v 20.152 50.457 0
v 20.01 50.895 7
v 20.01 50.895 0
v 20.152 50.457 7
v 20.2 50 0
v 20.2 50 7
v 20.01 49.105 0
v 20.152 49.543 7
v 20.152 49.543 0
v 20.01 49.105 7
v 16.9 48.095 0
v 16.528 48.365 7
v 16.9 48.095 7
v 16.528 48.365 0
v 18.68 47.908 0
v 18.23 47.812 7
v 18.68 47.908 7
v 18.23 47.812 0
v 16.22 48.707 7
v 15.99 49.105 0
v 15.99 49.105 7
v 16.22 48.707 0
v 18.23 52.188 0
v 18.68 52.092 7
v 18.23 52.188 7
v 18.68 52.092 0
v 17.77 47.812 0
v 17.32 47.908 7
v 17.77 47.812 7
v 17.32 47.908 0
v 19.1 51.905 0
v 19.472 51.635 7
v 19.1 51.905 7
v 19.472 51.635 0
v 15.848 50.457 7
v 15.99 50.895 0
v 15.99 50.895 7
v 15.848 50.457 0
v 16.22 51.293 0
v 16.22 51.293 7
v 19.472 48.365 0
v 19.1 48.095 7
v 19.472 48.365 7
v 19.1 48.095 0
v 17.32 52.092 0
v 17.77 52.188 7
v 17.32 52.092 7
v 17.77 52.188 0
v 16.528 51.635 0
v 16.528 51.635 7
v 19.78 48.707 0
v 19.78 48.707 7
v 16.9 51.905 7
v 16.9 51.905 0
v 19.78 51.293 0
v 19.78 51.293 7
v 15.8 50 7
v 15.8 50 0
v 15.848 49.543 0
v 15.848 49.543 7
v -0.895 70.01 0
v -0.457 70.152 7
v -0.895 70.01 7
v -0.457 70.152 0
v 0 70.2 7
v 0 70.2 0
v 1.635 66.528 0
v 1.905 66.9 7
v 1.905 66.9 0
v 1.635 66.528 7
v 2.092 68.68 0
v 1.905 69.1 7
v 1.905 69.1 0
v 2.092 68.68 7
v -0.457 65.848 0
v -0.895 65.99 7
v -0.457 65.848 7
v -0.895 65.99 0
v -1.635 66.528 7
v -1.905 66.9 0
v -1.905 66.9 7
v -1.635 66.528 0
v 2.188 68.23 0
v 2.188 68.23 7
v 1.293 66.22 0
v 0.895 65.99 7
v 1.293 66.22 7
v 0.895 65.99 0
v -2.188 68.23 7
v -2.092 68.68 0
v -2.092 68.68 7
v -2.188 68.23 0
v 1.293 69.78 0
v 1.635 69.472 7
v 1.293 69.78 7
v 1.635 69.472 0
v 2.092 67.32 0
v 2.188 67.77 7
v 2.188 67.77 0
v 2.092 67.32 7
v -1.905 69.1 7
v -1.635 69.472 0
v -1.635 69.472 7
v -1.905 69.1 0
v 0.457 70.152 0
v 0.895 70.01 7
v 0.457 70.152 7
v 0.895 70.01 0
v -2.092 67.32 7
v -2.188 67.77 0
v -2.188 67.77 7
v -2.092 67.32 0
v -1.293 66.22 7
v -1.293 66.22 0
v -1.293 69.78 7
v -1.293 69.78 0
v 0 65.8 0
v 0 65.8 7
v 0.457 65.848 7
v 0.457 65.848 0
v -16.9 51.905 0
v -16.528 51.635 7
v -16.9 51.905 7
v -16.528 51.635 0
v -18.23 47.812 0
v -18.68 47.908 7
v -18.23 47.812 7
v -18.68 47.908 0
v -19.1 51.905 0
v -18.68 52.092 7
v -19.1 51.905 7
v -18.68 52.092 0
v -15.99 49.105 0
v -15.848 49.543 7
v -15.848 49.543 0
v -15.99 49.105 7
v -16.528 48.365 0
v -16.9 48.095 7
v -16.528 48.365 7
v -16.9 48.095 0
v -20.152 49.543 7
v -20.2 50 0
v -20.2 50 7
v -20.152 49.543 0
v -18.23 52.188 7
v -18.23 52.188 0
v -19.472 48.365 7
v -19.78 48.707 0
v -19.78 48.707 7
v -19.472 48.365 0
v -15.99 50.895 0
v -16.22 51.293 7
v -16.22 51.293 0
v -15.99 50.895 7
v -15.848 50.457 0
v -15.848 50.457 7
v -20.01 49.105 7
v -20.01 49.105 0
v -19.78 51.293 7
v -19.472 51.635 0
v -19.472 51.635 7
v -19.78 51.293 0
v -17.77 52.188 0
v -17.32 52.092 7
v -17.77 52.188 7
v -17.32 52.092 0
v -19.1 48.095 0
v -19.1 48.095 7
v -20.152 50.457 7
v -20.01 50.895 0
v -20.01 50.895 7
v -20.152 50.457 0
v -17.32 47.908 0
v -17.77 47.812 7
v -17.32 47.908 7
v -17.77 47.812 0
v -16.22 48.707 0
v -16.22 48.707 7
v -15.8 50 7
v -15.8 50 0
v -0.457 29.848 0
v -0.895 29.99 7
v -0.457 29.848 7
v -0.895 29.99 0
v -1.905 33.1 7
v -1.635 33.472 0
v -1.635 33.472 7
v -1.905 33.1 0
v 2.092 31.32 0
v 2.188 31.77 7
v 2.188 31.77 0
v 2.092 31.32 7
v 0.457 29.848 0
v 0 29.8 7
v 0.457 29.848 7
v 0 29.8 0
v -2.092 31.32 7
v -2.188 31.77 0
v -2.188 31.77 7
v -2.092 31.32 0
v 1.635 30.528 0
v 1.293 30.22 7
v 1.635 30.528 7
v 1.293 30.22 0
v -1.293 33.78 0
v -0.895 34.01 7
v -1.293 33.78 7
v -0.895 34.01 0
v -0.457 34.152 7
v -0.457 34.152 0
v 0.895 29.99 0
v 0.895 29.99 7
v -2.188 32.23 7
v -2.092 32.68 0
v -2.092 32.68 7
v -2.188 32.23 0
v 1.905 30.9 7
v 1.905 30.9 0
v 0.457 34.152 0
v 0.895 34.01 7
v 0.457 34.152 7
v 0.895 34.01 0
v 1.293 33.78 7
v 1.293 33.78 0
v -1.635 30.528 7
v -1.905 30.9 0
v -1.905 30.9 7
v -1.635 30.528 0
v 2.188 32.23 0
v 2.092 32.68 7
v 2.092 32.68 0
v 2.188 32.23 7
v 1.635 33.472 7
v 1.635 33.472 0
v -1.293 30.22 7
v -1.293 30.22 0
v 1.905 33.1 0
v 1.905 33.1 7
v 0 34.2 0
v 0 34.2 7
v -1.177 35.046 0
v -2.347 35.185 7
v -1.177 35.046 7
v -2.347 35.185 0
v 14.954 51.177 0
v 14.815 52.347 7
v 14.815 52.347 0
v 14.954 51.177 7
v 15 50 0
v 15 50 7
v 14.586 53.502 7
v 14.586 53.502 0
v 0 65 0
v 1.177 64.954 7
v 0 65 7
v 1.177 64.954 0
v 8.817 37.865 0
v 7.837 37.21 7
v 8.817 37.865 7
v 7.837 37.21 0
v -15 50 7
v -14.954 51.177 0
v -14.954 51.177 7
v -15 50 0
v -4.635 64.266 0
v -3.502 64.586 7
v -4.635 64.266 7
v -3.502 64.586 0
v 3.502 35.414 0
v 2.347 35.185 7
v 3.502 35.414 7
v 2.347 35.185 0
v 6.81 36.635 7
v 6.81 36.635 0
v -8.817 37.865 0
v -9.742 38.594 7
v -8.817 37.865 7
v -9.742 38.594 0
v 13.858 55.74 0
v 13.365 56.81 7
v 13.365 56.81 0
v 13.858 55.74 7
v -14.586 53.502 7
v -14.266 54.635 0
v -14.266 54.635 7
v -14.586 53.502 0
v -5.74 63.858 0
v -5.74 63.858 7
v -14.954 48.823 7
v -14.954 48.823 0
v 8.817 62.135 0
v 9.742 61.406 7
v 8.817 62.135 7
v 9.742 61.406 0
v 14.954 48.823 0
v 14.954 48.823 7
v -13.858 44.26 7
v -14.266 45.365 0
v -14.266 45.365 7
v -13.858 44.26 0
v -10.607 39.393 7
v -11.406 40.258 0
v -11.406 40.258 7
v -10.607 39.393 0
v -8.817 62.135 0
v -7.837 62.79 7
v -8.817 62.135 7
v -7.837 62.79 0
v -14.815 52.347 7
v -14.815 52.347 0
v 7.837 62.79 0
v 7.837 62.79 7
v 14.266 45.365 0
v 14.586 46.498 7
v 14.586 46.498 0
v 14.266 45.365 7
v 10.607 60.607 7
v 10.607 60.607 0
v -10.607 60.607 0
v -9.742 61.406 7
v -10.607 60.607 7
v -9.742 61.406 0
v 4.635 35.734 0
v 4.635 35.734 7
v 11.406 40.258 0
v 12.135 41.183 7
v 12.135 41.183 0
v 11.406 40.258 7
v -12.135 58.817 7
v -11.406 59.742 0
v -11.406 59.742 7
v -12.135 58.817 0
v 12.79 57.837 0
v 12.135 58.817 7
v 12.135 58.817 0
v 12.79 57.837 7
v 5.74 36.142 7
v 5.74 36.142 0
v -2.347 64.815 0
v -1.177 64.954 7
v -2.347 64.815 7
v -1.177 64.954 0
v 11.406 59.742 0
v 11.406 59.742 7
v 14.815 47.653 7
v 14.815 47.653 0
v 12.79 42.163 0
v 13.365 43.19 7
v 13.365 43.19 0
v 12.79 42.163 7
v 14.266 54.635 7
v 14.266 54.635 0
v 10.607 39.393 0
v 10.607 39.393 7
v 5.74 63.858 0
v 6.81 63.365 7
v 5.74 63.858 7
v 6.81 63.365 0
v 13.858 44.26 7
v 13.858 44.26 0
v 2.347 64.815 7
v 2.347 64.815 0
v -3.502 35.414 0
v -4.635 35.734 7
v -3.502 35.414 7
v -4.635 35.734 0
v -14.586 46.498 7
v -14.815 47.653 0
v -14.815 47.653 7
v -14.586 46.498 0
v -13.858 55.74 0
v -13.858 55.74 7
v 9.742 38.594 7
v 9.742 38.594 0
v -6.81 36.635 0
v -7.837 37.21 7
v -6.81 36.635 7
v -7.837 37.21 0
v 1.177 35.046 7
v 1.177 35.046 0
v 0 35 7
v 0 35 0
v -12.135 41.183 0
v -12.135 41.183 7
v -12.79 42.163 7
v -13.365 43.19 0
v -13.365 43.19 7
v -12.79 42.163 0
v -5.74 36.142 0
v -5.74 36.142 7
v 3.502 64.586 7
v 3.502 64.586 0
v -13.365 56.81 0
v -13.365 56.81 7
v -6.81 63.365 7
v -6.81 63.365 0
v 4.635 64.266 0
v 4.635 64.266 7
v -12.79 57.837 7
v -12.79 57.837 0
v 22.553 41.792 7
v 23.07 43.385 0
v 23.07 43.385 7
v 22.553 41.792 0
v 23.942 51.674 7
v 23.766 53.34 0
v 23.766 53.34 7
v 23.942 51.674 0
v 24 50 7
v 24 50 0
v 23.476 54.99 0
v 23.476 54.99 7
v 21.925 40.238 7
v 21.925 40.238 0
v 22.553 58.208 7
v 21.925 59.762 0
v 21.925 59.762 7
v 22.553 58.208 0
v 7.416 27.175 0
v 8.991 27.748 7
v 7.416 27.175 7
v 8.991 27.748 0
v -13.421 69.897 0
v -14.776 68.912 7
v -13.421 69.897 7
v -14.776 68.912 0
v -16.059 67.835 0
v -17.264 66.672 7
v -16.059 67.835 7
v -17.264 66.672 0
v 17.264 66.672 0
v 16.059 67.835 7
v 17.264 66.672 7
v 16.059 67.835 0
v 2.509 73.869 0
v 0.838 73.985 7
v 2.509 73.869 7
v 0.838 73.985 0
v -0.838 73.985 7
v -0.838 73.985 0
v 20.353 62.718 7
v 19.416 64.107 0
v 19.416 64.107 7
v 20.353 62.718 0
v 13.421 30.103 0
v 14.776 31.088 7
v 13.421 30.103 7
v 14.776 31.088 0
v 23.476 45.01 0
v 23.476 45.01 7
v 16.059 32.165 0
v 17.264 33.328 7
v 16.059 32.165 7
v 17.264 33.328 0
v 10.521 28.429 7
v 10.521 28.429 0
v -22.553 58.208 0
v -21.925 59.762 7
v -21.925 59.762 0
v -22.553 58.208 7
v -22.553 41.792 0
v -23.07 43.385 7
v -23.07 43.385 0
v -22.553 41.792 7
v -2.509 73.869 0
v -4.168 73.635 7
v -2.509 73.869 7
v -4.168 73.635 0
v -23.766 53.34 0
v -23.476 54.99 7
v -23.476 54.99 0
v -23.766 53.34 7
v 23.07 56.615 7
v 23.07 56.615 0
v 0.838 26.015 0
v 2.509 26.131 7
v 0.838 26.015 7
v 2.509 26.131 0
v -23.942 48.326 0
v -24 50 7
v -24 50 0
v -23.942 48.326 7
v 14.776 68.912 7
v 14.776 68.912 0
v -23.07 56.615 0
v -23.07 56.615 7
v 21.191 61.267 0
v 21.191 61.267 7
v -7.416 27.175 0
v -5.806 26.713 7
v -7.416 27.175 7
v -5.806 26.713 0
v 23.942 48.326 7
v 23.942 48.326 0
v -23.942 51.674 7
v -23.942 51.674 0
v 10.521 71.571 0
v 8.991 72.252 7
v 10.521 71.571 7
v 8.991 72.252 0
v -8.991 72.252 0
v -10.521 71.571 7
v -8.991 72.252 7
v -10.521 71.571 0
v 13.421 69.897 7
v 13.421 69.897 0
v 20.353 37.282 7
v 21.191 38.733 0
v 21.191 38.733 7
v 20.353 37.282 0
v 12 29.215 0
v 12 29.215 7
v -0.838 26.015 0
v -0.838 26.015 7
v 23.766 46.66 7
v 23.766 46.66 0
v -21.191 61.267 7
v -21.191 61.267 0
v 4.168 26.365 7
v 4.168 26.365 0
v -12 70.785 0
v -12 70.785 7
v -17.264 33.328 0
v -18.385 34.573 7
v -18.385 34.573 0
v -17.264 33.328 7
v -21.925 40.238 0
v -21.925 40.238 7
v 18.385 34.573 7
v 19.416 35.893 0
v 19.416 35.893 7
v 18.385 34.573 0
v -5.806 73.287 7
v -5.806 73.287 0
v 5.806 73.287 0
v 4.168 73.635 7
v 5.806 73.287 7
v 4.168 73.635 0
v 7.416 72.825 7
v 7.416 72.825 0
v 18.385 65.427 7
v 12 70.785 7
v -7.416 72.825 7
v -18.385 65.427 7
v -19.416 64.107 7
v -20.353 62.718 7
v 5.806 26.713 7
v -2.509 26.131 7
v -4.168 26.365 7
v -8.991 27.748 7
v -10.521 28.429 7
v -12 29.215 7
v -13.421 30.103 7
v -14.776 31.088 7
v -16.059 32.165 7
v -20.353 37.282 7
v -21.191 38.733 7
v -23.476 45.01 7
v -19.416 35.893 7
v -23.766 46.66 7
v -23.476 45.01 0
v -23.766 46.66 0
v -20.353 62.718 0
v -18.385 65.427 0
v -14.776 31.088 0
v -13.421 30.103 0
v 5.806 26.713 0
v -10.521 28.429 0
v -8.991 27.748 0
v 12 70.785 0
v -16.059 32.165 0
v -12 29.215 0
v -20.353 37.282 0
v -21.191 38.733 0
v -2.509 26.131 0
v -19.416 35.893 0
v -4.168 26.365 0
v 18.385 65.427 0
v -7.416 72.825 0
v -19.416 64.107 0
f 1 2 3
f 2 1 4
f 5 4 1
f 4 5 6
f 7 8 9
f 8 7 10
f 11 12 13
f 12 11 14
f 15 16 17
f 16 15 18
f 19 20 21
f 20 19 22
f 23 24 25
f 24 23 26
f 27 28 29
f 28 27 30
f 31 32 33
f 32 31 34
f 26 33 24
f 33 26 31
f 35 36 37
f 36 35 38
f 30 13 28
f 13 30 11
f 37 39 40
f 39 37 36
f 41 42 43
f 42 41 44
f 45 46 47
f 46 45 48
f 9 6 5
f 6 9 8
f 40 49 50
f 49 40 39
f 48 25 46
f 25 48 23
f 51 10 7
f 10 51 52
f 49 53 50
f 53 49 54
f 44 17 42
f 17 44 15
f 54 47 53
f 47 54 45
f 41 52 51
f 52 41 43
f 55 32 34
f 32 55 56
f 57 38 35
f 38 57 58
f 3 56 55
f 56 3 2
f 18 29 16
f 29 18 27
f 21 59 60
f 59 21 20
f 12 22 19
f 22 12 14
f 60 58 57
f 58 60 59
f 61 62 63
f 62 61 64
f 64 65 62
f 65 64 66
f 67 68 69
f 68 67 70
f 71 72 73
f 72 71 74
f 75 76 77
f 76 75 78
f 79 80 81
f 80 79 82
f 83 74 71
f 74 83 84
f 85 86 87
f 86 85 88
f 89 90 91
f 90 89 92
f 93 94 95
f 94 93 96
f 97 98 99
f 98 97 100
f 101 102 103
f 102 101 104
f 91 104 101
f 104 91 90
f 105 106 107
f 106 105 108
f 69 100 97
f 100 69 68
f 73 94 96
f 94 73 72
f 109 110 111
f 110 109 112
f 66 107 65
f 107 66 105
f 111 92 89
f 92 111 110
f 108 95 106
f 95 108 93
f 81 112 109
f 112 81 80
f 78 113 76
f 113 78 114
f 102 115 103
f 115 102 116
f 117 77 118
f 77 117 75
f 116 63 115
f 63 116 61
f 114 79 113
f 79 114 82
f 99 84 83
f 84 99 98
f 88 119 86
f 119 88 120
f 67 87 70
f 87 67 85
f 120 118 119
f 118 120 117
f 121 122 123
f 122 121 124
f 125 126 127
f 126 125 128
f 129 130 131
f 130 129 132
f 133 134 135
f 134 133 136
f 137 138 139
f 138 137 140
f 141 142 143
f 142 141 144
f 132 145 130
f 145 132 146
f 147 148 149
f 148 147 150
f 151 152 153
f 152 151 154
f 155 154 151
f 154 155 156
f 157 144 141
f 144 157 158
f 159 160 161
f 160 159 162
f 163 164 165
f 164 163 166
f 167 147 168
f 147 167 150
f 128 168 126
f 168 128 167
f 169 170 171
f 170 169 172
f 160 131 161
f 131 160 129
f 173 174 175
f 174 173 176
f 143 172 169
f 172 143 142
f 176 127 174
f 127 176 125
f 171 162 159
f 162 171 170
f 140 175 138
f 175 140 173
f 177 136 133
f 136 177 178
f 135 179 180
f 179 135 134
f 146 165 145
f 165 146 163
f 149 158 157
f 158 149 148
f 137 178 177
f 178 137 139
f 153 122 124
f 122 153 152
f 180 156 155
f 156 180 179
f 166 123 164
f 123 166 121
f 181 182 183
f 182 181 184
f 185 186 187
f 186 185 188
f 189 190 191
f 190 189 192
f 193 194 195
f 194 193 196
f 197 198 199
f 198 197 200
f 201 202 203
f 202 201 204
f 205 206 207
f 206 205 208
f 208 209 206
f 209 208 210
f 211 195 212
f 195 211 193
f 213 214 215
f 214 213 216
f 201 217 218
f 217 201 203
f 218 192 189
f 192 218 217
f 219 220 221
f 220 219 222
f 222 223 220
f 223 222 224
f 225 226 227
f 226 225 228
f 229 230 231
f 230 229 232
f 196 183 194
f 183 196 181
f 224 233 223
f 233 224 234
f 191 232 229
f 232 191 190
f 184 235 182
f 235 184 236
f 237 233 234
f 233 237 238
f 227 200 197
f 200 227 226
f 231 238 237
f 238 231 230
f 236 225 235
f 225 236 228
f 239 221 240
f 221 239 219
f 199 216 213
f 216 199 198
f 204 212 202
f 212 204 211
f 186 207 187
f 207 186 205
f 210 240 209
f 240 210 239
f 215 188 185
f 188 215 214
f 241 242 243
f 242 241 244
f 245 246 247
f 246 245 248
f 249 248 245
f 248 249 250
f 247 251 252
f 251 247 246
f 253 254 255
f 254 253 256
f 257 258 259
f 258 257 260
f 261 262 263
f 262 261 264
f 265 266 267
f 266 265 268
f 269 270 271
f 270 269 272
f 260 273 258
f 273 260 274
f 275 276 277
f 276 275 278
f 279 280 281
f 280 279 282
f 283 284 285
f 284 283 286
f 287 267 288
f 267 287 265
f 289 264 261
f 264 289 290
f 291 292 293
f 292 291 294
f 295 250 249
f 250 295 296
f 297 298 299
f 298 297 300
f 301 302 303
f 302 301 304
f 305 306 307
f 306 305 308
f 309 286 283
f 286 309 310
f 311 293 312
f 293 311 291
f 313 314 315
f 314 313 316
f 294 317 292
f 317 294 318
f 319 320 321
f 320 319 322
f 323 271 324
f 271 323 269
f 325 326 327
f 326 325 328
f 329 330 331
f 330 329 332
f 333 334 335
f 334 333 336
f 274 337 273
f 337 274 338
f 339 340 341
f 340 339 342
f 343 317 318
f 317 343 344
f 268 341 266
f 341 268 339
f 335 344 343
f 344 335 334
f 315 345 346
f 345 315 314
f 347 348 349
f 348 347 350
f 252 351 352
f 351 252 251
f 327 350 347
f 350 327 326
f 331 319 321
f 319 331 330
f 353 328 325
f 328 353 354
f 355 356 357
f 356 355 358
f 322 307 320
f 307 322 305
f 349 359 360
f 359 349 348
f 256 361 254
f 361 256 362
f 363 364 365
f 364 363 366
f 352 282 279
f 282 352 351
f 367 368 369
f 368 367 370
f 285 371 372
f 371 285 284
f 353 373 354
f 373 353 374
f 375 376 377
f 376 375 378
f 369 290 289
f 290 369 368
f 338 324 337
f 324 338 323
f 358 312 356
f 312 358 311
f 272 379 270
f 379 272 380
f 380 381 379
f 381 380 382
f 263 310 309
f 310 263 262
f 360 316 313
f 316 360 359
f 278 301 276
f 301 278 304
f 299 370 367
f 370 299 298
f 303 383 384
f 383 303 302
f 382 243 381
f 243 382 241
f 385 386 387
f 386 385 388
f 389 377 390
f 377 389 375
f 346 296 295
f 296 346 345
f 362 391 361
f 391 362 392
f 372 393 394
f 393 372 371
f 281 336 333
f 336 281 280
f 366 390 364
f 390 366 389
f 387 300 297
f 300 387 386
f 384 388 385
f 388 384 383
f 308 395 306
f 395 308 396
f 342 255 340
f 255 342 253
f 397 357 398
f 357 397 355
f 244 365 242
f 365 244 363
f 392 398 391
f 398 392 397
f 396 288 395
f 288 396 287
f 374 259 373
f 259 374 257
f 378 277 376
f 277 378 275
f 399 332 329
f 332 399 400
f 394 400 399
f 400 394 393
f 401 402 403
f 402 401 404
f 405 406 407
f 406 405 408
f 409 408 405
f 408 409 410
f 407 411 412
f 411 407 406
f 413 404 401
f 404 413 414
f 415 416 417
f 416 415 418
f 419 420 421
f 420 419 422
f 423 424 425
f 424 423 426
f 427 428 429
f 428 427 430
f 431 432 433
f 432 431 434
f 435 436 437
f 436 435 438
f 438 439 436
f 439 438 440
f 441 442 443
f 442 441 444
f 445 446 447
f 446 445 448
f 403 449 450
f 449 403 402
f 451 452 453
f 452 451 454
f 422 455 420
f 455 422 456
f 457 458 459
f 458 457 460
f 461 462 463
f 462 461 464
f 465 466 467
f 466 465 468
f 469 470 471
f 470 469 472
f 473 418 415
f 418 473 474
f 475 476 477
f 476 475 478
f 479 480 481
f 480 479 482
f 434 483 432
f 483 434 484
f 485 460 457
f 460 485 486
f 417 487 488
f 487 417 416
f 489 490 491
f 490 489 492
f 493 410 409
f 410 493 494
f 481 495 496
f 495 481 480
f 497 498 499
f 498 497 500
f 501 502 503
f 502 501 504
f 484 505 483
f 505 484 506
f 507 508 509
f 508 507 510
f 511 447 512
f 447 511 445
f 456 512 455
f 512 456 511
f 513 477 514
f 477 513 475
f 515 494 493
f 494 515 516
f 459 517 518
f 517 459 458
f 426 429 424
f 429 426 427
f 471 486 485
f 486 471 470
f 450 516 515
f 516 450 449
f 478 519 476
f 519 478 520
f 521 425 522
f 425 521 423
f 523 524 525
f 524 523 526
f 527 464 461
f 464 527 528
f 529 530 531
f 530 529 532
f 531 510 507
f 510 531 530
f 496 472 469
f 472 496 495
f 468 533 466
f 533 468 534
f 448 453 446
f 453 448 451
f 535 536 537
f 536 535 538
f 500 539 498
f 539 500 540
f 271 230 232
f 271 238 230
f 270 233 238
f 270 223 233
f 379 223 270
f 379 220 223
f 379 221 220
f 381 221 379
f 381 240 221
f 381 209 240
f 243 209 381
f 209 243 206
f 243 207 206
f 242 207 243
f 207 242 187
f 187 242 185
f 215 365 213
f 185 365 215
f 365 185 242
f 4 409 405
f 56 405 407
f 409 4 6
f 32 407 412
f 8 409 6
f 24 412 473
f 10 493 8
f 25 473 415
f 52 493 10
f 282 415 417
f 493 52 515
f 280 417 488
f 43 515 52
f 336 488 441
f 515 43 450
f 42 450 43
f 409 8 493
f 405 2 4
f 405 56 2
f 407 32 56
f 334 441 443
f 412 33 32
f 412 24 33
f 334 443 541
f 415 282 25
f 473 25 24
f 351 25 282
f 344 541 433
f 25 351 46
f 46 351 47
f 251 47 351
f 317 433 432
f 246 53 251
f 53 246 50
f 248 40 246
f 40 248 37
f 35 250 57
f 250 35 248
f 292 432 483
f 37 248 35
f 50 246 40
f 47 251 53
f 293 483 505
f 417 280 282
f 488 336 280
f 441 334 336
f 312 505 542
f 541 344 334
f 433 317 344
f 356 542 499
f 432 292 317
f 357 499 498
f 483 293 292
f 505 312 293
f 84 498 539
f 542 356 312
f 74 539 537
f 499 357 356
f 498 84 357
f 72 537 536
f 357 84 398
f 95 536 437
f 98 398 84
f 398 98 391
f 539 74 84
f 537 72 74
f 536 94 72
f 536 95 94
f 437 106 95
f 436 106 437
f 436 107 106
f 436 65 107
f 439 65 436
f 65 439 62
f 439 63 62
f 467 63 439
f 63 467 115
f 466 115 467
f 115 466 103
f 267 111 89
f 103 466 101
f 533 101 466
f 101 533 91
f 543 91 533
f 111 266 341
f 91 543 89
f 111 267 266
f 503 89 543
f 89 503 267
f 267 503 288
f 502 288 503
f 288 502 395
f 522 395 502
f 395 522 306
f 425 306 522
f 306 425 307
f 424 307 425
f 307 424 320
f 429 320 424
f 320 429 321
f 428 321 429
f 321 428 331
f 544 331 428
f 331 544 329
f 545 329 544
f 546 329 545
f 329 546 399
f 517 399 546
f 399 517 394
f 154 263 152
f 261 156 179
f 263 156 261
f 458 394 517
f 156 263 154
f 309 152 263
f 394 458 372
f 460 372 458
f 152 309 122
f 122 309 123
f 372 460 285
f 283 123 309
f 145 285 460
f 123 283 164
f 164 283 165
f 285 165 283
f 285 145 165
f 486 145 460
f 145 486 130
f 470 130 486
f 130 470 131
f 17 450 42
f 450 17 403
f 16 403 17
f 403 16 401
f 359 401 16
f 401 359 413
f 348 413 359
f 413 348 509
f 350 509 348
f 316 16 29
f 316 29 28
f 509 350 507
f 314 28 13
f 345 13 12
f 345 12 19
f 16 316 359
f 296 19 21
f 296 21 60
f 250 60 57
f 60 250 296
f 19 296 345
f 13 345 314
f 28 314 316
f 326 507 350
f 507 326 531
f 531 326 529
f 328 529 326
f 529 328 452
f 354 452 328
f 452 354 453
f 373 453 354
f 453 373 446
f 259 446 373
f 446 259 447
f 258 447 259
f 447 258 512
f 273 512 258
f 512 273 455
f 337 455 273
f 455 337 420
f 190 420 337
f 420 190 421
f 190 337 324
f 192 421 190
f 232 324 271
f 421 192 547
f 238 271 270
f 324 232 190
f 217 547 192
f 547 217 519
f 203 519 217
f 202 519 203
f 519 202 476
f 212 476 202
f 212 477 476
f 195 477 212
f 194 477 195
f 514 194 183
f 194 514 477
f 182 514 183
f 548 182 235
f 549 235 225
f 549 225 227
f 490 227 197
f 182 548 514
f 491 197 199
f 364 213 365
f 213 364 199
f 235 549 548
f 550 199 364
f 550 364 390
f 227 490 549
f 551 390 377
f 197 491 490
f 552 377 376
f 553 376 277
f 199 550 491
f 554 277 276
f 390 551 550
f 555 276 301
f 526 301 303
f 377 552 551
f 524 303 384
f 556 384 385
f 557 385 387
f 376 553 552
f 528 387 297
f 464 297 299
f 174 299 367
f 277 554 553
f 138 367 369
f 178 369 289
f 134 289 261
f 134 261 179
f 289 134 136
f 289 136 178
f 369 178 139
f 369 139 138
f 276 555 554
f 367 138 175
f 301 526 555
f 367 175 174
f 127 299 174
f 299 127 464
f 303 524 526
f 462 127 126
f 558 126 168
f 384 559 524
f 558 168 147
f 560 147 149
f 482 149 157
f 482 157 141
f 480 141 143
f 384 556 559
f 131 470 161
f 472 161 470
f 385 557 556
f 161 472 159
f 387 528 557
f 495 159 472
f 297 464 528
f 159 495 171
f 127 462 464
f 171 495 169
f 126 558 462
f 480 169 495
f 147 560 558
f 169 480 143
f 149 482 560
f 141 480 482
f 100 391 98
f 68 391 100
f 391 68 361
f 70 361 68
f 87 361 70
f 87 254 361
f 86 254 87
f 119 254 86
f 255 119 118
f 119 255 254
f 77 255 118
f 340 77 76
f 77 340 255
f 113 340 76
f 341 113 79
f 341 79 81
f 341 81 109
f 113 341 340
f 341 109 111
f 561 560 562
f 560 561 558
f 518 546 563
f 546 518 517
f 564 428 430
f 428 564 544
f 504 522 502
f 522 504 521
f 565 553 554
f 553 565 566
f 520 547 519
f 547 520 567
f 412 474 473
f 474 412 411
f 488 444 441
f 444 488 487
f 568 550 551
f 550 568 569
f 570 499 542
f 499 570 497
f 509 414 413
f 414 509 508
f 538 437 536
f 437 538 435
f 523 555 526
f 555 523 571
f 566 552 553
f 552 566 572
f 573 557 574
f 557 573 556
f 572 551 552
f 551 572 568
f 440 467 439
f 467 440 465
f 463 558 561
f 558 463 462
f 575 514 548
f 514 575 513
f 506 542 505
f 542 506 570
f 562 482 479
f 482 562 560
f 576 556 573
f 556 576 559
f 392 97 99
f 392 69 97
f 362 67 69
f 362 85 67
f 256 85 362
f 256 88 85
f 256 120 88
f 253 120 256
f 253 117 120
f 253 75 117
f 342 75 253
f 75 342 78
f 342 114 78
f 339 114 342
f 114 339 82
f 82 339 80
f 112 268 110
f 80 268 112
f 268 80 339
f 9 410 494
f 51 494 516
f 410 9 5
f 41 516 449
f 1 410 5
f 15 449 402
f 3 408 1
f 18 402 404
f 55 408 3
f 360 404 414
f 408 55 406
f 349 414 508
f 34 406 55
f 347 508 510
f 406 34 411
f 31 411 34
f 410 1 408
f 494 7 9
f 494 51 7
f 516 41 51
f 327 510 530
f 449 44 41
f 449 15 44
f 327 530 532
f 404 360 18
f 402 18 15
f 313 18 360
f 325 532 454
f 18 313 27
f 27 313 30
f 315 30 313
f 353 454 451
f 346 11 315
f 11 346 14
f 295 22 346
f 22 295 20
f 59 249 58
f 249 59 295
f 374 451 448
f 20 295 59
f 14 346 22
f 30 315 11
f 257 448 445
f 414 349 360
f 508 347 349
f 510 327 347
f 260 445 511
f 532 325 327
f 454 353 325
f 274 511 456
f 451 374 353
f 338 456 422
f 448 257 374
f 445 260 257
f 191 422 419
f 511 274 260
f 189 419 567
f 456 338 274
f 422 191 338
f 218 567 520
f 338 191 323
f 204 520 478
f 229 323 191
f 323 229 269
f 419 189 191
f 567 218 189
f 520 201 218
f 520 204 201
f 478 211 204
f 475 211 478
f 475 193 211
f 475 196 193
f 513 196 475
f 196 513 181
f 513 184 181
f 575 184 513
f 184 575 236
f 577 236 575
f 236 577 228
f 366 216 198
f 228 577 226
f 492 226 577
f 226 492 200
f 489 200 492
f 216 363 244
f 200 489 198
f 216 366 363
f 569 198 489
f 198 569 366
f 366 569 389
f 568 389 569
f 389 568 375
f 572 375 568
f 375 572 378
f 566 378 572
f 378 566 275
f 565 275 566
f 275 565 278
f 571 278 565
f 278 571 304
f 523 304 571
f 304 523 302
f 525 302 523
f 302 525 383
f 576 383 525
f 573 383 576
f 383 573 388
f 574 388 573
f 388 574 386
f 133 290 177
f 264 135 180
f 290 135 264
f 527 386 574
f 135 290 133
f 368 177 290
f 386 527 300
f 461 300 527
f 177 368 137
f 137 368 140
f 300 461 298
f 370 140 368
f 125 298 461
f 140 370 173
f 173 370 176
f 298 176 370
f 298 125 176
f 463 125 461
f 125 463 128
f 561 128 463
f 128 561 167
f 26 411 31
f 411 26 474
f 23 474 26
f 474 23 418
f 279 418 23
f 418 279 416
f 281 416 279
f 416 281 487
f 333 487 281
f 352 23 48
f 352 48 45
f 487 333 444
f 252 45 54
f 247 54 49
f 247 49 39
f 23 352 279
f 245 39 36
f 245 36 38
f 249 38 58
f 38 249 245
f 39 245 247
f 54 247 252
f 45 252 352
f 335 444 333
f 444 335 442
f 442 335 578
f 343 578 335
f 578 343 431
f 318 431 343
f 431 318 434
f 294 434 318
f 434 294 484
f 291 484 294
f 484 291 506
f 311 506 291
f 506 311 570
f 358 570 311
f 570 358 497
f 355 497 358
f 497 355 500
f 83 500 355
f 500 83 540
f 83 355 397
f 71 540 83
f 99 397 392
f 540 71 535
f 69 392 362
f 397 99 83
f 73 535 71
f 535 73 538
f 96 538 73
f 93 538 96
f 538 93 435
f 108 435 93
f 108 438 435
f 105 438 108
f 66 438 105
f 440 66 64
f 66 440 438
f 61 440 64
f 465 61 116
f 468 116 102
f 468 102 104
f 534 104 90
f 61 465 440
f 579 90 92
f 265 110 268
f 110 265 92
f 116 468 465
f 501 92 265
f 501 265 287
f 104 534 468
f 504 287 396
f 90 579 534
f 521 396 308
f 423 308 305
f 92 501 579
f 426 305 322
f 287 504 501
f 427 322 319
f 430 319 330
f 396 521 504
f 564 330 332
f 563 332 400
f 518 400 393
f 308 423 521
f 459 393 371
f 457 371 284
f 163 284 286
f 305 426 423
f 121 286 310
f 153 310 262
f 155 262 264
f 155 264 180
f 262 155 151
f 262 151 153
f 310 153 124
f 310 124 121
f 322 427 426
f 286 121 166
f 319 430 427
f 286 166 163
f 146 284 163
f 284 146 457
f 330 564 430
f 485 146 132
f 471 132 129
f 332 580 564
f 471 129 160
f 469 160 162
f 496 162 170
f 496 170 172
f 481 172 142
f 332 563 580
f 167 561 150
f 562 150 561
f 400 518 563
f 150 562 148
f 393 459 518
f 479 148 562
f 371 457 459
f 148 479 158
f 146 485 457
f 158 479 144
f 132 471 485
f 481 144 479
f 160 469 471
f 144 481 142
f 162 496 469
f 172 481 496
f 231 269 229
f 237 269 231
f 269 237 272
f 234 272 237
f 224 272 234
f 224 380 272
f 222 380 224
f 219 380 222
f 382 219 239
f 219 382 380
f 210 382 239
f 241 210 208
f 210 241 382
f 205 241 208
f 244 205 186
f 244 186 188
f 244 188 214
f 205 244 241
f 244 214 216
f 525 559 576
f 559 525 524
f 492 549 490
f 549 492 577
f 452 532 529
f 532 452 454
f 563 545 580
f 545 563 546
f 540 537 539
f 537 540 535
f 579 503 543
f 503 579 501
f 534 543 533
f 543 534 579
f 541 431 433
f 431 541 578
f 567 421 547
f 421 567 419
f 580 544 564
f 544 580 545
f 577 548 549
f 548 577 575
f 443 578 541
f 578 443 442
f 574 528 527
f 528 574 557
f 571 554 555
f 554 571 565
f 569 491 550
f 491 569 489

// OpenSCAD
bolt_d=inches(1/2);
set_ang=[45:90:359];
m4_dist=18;
od=48;
wall_id=44;
difference() {
  union() {
    cylinder(d=od,h=10,$fn=90);
    cylinder(d=20,h=20,$fn=60);
    translate([0,0,17]) for(r=set_ang) rotate([0,0,r]) rotate([0,90]) translate([-3,-5,7]) cube([12,10,6]);
  }
  translate([0,0,16]) for(r=set_ang) rotate([0,0,r]) rotate([0,90]) {
      cylinder(d=3,h=20,$fn=20);
      translate([-14,-3,8]) cube([17.1,6,2.4]);
    }
  translate([0,0,-.01]) {
    cylinder(d=bolt_d,h=20.02,$fn=30);
    for(r=[0:90:359]) rotate([0,0,r]) translate([m4_dist,0]) cylinder(d=4.4,h=10.02,$fn=30);
  }
}
//mirror([0,0,1])
!translate([0,50])
{
  difference(){
    cylinder(d=od,h=7,$fn=90);
    translate([0,0,-.01]) {
      cylinder(d=m4_dist*2-6,h=10.02,$fn=80);
      for(r=[0:90:359]) rotate([0,0,r]) translate([m4_dist,0]) cylinder(d=4.4,h=10.02,$fn=30);
     
    }
    *for(r=[0,90]) rotate([0,0,r]) translate([-25,-5,5+1.2]) cube([50,10,5]);
    *translate([0,0,5+1.2]) difference() {
      translate([0,0,.01]) cylinder(d=od+1,h=5,$fn=80);
      cylinder(d=wall_id,h=5,$fn=80);
    }
  }
}
function inches(mm) = 25.4 * mm;
